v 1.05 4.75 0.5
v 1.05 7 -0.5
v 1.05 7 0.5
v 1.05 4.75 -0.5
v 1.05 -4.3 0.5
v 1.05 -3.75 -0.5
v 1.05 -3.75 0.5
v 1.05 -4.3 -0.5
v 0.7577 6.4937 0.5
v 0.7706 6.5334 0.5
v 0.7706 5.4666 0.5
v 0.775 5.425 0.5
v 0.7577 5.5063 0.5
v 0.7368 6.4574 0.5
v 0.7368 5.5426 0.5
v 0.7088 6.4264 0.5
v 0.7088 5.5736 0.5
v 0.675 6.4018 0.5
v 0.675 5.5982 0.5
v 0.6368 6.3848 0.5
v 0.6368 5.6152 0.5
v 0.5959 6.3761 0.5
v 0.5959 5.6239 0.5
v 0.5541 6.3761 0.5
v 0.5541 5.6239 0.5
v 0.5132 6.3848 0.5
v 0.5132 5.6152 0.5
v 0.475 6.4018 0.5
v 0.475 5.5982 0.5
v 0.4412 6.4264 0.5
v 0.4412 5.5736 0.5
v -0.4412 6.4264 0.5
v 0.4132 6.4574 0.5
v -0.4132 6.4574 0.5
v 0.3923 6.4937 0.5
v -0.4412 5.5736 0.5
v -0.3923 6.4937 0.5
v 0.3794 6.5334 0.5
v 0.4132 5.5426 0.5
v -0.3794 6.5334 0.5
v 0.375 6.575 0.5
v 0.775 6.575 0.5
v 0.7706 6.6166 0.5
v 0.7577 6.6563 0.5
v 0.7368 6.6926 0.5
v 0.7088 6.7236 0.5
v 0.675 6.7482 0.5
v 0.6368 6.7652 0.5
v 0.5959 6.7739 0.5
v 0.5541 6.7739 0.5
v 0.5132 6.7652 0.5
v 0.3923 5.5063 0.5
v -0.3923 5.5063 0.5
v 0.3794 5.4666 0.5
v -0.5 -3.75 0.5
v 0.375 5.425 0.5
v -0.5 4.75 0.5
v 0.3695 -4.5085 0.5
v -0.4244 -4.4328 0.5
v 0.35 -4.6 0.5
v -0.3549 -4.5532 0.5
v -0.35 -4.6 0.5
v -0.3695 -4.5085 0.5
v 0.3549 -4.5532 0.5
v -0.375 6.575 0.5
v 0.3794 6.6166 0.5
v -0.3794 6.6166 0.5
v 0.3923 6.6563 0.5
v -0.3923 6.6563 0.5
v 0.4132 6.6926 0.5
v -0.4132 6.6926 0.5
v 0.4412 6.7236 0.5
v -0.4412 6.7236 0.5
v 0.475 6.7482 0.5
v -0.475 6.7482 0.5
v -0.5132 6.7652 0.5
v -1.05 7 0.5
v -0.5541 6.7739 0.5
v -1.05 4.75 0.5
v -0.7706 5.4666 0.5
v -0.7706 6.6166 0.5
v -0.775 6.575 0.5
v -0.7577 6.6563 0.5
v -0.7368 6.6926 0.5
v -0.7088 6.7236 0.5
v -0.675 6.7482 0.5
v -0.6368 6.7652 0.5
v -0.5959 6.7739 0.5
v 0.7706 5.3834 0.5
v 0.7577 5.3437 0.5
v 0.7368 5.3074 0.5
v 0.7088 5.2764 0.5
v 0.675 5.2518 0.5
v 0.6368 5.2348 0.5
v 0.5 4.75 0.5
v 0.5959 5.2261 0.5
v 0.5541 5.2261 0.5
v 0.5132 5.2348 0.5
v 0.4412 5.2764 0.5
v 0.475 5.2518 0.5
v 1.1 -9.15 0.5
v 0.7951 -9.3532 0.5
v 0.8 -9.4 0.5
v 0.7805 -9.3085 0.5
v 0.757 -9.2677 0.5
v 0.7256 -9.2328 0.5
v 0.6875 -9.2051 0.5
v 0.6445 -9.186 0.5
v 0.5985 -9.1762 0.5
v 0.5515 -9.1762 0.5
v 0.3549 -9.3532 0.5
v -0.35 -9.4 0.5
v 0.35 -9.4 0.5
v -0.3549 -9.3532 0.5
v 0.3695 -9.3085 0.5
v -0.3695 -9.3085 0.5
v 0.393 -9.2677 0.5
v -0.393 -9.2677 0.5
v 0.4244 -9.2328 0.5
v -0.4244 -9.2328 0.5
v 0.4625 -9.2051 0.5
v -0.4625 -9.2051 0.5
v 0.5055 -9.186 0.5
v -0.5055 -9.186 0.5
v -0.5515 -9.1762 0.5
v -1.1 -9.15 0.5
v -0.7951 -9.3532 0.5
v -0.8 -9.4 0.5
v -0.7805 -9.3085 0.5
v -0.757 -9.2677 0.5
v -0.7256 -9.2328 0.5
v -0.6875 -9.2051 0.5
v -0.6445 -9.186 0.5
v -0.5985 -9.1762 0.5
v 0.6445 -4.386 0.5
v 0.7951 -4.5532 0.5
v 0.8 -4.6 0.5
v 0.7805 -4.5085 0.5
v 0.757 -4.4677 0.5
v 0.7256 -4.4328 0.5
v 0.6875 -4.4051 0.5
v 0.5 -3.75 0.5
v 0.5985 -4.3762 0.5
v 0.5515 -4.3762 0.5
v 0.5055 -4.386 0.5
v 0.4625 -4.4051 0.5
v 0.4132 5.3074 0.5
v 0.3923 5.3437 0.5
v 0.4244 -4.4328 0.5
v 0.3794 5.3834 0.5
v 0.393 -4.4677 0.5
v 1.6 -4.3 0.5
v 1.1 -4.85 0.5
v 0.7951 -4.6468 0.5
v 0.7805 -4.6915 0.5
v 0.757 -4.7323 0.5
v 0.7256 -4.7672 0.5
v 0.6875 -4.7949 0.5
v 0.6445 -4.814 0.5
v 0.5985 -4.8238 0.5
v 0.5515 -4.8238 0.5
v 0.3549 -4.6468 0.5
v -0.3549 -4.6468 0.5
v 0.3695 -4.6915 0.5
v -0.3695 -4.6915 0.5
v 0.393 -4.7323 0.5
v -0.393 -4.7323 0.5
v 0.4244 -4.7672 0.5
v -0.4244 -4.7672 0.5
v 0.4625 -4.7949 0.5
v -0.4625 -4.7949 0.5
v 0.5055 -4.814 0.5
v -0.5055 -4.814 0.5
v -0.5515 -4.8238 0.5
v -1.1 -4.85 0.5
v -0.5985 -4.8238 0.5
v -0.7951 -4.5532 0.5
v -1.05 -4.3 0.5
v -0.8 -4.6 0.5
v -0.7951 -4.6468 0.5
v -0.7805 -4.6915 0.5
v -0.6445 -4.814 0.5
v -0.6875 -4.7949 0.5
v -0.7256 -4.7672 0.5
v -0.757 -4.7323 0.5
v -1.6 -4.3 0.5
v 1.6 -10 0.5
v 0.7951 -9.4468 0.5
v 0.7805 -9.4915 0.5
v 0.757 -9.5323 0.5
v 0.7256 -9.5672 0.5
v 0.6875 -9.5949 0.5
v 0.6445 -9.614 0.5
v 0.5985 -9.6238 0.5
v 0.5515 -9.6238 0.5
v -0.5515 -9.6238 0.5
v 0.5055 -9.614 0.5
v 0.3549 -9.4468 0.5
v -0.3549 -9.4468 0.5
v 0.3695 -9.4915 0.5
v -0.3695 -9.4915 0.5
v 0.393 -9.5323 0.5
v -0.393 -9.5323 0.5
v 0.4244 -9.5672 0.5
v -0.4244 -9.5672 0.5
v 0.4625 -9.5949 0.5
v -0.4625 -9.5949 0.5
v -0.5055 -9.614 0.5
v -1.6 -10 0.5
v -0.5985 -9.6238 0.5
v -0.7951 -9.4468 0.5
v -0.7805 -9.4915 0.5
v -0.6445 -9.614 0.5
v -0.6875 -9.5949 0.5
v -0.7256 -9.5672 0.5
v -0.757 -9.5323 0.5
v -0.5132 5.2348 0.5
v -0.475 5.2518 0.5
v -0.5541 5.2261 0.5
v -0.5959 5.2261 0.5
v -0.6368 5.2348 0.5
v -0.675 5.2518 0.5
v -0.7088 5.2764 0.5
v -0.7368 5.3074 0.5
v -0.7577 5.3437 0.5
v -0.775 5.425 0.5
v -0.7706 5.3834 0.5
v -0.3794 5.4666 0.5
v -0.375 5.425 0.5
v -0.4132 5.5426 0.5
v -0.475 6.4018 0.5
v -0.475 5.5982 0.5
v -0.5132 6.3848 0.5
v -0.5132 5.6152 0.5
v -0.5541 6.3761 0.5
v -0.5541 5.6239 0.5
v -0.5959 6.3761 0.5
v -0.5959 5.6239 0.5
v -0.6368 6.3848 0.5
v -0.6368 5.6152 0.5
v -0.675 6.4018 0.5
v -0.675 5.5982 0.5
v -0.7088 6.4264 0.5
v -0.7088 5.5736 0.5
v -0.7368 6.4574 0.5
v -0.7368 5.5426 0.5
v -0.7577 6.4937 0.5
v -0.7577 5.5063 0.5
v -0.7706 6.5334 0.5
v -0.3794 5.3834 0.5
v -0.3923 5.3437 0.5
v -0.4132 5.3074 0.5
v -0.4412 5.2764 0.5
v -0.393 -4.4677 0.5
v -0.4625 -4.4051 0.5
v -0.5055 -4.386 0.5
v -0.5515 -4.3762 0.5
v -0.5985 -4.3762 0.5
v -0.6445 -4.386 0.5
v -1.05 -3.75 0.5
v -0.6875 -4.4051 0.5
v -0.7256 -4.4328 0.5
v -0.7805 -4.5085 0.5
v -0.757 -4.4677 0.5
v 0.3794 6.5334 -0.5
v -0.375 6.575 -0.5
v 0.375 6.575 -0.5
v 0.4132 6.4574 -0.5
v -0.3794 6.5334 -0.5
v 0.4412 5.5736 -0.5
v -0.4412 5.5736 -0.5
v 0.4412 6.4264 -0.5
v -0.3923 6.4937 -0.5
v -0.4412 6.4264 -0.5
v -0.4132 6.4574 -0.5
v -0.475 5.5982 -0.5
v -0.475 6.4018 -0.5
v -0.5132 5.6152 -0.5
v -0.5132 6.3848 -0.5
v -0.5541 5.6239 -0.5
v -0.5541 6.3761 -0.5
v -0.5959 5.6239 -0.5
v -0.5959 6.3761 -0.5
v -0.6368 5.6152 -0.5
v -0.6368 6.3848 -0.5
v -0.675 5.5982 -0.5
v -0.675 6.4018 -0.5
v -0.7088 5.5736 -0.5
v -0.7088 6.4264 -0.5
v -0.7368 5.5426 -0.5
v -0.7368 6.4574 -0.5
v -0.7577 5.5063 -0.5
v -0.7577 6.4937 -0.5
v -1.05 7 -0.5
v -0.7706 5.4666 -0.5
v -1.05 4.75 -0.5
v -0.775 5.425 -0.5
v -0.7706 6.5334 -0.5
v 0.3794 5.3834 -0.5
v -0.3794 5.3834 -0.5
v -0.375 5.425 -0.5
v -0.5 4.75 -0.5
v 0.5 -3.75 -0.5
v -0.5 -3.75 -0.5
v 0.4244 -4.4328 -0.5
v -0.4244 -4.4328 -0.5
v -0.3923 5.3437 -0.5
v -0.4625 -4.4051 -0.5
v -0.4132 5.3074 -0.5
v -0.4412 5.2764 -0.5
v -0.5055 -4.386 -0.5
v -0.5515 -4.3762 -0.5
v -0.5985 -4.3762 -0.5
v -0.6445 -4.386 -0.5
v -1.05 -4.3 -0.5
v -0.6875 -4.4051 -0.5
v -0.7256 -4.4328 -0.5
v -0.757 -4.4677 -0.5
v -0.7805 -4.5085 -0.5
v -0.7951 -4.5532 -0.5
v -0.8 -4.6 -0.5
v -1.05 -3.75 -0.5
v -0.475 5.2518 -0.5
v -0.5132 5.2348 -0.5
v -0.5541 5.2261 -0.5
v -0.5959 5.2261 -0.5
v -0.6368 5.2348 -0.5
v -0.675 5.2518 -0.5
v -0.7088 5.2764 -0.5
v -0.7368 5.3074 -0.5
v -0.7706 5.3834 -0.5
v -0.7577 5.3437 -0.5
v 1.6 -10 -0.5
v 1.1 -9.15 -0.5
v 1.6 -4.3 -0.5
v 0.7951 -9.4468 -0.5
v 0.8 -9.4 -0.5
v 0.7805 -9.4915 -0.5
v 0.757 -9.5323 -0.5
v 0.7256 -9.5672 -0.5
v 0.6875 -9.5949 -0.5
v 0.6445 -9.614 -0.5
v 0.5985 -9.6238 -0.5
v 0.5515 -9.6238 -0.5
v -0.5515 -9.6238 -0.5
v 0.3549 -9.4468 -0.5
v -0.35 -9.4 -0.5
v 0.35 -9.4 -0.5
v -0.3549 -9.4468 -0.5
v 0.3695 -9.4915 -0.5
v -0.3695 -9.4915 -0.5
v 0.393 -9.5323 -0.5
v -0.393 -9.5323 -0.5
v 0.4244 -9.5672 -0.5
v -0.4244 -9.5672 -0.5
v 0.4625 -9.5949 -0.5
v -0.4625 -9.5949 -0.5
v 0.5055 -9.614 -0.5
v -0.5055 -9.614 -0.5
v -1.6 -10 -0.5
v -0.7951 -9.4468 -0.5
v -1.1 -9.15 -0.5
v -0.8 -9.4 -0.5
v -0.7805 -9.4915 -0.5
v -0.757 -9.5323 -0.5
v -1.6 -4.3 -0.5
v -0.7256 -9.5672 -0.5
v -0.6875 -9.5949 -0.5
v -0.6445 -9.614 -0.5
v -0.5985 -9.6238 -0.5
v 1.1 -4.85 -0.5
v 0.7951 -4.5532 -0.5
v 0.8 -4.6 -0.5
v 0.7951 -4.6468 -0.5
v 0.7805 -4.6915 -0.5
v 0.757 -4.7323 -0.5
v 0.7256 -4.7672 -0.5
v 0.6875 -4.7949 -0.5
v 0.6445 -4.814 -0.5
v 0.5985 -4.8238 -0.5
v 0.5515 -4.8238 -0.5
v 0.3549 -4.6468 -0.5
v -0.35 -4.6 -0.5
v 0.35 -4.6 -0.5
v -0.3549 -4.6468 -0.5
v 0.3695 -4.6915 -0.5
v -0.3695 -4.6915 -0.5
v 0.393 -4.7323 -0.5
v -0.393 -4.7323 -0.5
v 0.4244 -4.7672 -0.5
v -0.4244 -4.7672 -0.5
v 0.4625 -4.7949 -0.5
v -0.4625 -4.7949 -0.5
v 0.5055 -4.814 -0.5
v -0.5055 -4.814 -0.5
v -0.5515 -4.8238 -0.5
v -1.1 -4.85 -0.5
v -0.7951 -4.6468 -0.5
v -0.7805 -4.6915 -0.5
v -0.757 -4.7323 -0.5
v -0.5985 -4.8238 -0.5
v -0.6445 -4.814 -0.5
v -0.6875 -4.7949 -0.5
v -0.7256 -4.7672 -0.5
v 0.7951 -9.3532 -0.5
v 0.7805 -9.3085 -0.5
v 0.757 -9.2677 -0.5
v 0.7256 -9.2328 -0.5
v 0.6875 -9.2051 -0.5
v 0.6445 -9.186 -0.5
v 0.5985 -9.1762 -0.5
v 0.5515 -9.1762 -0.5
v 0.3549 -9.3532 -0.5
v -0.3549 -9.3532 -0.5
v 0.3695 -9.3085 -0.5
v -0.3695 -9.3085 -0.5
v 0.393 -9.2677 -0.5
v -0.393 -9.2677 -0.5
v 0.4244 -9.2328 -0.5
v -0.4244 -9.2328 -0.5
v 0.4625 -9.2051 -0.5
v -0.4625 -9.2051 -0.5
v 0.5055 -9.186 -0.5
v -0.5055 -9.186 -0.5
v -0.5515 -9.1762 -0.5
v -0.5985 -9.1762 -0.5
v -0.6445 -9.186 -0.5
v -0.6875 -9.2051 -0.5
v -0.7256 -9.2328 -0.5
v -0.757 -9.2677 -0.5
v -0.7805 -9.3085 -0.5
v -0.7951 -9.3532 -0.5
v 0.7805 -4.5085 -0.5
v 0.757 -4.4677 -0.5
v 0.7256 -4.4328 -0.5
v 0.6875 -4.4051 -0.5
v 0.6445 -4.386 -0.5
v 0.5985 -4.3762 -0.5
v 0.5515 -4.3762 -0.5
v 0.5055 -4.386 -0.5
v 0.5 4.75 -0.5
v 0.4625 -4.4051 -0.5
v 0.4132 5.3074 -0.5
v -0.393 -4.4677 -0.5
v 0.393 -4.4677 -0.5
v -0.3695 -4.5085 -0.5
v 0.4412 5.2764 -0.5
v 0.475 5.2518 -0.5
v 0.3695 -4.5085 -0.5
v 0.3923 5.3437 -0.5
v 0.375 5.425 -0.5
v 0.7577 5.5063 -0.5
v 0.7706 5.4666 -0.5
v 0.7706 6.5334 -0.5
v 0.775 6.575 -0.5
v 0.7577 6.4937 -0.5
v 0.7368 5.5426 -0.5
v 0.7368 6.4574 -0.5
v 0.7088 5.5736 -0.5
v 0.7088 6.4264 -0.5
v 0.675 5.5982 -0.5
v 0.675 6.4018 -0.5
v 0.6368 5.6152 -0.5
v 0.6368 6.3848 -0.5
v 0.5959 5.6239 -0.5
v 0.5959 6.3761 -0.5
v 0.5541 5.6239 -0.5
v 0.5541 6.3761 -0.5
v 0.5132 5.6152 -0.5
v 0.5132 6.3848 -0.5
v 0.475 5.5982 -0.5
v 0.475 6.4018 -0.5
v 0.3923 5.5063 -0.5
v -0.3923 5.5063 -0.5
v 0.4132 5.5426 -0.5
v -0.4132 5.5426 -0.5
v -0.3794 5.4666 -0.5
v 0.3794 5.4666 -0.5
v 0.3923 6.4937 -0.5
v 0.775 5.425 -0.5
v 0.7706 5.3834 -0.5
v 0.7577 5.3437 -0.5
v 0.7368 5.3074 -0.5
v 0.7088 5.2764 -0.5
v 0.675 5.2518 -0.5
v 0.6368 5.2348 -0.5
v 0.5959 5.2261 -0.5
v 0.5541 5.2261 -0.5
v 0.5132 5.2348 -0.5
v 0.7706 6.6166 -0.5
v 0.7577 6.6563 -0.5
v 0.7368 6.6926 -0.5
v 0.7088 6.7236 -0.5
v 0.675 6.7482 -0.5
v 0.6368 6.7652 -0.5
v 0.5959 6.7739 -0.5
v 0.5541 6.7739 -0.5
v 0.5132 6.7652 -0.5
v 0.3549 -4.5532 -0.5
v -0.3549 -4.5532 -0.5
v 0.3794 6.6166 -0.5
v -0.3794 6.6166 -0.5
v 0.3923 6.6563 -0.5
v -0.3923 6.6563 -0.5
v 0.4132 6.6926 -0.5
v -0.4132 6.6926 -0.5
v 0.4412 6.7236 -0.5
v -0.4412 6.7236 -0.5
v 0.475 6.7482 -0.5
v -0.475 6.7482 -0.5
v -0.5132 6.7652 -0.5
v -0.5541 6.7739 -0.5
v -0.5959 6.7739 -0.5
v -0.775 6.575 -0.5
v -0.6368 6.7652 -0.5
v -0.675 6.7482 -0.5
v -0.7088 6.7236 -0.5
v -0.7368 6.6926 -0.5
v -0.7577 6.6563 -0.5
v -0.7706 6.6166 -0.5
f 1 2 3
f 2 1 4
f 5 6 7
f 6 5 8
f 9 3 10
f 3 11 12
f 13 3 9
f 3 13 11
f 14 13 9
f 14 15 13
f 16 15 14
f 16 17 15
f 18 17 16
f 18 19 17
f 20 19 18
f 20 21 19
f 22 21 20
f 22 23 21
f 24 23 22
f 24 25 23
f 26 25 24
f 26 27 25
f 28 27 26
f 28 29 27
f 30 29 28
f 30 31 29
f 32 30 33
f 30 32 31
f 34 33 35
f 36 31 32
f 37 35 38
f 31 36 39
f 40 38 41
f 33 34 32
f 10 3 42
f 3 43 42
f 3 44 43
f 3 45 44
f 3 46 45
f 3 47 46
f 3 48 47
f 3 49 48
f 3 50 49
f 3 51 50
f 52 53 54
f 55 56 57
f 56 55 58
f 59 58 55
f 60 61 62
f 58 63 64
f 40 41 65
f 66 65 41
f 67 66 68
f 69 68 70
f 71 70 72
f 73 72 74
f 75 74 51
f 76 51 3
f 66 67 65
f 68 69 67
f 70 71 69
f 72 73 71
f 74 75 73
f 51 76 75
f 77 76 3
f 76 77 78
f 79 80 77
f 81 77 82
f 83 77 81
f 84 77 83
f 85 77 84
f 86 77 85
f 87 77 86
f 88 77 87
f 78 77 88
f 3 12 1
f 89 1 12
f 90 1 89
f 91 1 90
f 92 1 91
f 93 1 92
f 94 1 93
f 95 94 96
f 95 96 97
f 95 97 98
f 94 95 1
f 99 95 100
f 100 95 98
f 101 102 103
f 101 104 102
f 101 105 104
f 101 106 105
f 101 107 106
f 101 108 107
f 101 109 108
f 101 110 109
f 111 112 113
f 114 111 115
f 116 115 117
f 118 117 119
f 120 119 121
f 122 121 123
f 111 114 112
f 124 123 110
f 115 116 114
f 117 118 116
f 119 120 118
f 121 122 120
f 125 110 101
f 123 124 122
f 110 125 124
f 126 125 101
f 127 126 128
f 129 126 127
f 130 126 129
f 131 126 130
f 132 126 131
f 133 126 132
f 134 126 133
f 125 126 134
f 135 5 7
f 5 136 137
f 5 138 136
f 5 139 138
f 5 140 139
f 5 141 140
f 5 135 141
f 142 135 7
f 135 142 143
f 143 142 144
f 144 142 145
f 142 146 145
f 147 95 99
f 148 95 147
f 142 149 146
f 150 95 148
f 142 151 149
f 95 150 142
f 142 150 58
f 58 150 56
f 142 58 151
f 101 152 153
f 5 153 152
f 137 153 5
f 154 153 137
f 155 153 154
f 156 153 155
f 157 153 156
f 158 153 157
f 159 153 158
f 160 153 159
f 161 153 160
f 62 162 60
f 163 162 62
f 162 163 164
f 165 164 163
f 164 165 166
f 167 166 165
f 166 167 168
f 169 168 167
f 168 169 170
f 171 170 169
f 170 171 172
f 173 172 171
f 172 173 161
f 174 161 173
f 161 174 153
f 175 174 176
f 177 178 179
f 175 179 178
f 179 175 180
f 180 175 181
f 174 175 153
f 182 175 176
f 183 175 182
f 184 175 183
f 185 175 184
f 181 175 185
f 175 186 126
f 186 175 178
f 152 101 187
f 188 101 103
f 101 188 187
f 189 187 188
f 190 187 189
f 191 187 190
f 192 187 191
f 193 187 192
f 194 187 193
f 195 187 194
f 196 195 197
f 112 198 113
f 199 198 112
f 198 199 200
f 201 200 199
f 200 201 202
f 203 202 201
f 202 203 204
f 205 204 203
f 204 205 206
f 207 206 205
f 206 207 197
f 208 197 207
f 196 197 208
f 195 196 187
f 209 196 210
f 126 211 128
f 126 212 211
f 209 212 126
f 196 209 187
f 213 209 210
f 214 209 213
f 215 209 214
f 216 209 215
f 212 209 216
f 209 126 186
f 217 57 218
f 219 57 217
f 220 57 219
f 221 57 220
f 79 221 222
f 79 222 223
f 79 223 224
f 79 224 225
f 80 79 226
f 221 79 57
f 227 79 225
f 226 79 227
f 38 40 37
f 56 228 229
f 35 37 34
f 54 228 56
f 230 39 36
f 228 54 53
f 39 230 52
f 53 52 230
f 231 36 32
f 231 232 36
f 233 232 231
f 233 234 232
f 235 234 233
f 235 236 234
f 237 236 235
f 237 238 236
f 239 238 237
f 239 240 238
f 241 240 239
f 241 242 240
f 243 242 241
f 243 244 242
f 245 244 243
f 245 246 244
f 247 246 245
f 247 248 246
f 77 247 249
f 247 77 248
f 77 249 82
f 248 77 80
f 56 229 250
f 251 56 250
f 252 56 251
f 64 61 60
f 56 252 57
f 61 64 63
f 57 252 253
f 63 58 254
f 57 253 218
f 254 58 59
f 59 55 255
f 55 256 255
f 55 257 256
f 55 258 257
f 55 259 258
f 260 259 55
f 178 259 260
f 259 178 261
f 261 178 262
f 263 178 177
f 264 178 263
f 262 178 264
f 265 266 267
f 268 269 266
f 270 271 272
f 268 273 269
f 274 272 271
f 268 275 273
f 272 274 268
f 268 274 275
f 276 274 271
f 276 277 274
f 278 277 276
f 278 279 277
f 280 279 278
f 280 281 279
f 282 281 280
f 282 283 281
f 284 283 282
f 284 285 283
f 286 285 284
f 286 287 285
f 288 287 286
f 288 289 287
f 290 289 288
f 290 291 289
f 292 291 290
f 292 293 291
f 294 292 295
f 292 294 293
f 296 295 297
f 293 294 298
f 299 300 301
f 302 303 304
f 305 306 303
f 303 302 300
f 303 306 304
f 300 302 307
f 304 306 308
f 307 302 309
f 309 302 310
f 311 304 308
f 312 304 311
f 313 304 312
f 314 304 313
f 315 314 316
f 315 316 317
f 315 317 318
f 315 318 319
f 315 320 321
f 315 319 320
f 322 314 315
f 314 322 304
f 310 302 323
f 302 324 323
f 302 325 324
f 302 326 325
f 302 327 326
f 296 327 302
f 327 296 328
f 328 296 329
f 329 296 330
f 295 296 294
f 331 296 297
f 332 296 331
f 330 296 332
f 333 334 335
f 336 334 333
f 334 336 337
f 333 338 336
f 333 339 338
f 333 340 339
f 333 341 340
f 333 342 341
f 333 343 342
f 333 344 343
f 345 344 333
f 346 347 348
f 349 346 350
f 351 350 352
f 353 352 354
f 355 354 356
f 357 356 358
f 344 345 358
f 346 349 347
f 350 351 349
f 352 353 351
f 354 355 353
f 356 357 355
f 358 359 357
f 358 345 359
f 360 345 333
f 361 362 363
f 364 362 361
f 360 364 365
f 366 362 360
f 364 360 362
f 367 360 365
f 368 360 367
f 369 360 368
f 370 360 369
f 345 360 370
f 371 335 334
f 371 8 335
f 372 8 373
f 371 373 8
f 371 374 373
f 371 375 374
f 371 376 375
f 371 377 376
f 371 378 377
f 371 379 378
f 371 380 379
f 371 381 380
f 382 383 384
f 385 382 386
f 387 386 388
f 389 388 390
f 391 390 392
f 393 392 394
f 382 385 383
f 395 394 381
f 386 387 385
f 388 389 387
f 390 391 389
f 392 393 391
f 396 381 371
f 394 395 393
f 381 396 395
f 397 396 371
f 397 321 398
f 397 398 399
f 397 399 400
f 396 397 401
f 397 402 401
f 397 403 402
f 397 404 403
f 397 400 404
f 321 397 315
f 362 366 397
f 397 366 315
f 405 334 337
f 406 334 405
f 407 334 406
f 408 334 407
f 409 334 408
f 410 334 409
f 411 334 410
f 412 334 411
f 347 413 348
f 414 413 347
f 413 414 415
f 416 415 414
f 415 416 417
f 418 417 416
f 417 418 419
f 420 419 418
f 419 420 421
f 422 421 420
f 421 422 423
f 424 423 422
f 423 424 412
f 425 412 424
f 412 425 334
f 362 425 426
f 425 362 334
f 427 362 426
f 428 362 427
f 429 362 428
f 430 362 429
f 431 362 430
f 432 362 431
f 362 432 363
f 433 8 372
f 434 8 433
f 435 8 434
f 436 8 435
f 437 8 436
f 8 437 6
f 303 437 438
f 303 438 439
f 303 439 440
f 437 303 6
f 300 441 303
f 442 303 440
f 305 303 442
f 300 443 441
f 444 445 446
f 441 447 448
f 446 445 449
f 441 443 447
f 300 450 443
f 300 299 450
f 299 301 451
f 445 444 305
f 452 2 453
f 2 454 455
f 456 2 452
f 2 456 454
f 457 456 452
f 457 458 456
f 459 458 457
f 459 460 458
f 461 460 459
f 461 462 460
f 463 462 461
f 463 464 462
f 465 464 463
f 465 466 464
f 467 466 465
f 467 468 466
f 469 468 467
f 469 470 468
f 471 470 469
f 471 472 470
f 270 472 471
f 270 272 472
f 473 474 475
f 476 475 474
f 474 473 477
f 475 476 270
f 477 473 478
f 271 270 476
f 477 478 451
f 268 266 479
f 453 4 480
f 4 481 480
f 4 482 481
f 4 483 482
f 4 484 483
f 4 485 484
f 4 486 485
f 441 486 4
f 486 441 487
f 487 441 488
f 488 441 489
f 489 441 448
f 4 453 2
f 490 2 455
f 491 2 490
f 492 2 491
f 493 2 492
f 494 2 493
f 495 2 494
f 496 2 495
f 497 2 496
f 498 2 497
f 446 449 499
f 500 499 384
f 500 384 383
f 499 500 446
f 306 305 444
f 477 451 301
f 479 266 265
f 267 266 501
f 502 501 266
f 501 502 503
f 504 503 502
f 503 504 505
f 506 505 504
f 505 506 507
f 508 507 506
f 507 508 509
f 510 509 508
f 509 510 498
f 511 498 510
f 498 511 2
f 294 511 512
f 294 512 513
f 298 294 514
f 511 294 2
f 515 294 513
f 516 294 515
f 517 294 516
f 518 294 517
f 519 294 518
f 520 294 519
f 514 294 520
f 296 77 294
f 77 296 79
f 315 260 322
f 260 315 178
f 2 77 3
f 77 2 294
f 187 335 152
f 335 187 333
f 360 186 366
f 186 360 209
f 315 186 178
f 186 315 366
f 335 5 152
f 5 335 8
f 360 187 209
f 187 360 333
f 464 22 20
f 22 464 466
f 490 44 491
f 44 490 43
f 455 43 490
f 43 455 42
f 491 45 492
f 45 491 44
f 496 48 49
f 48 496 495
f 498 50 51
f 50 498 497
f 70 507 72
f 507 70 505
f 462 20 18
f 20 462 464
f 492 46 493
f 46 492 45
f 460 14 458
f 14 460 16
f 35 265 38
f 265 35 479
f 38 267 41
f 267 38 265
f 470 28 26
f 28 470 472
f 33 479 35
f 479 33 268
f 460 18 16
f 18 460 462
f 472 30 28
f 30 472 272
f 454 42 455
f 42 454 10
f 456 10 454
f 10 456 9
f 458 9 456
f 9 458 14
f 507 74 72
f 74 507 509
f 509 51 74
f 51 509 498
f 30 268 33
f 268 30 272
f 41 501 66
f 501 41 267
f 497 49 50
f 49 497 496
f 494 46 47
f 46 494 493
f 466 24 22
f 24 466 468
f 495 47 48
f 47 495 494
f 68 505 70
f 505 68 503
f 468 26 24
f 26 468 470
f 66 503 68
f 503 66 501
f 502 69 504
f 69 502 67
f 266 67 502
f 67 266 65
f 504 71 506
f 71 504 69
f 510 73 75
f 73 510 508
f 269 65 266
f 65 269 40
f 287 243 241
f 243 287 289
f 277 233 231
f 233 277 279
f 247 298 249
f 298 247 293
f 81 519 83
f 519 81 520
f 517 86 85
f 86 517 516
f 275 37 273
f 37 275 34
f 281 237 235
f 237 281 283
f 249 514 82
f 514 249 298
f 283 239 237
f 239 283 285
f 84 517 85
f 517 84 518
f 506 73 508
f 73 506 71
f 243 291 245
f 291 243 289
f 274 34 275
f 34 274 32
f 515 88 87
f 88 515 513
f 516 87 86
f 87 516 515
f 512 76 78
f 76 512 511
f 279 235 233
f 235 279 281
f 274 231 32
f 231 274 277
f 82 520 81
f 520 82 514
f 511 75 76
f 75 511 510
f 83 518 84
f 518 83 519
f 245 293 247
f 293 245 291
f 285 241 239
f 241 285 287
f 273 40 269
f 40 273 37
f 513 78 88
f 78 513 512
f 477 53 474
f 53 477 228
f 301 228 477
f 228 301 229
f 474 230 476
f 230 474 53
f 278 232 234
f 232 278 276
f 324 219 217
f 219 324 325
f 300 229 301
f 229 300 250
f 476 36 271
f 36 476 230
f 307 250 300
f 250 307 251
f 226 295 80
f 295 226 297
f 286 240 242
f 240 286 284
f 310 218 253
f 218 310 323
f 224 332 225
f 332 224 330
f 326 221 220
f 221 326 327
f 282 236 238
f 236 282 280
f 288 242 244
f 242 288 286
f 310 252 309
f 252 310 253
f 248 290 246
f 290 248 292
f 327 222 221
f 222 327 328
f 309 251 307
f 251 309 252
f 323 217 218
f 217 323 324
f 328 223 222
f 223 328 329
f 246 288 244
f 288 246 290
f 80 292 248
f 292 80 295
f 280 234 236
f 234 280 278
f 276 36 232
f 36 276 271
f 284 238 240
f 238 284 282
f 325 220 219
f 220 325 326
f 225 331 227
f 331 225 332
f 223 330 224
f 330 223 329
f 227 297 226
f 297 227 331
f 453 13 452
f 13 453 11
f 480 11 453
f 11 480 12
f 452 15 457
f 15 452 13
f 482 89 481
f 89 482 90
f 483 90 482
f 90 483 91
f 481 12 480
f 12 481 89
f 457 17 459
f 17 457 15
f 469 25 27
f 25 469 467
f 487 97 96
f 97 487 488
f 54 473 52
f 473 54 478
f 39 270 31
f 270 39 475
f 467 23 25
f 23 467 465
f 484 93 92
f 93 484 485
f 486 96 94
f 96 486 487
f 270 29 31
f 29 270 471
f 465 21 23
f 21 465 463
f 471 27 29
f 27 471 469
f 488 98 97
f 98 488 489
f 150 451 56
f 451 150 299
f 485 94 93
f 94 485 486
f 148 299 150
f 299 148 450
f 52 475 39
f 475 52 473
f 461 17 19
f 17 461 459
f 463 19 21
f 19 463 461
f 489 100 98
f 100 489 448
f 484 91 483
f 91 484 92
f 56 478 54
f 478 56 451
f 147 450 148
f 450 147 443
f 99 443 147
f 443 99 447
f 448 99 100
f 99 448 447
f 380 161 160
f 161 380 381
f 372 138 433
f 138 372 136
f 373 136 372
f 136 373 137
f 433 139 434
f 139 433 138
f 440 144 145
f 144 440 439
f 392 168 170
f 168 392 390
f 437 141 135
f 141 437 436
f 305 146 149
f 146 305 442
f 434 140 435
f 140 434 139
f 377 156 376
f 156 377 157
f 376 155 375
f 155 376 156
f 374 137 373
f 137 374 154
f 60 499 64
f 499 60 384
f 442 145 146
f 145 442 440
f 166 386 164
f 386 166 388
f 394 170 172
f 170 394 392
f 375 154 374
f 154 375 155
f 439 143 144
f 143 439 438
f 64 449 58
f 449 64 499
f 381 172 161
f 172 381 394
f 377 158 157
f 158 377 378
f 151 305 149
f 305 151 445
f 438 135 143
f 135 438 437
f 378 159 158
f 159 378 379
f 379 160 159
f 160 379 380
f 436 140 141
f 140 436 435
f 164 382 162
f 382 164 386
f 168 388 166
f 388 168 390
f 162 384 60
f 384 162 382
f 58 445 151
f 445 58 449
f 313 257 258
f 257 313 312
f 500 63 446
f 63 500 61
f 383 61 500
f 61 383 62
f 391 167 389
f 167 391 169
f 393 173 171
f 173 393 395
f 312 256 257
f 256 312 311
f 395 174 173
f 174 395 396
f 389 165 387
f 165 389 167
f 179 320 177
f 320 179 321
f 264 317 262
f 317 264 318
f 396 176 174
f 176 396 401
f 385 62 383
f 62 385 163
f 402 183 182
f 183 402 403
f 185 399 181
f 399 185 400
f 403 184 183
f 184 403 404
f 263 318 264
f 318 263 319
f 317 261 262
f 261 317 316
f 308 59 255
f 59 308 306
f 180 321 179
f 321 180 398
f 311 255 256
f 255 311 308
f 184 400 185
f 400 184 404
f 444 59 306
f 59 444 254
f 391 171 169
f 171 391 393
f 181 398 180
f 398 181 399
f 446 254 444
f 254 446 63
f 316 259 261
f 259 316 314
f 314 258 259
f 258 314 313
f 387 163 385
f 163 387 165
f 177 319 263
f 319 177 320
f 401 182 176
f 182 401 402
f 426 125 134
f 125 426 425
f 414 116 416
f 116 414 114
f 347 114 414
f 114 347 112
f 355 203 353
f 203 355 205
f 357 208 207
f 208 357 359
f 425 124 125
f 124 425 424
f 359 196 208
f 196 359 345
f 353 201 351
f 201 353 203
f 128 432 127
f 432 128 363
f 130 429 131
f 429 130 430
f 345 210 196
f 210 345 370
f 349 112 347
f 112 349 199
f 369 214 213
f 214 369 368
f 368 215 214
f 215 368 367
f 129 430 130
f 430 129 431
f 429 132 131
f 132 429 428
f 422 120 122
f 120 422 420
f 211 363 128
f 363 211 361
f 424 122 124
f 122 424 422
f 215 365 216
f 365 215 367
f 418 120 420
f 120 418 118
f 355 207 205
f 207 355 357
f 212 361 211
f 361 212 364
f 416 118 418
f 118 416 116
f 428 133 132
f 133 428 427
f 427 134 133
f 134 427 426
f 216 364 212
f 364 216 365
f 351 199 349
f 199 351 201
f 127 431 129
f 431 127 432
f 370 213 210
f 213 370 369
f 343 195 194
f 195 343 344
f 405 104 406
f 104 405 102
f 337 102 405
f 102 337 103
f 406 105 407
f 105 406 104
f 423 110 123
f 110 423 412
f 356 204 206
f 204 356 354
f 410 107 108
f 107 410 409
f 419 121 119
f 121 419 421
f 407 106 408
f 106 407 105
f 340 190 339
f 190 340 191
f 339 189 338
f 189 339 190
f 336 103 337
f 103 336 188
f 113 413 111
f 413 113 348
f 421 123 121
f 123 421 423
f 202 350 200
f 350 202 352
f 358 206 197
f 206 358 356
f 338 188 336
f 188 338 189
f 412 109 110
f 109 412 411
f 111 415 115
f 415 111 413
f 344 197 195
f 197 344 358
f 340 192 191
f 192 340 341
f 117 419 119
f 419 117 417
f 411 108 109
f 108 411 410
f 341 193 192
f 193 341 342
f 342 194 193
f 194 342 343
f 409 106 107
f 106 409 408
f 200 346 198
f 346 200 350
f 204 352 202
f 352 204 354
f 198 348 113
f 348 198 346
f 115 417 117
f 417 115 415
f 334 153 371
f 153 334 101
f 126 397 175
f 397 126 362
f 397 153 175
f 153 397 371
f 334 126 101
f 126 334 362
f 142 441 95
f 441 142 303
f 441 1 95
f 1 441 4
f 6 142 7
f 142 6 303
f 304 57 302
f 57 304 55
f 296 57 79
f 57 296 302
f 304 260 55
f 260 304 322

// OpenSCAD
$fn=30;
module backarm_holes() {
	translate([1.15/2, 1.15/2, 0]) cylinder(d=0.4, h=4, center=true);
	translate([-1.15/2, 1.15/2, 0]) cylinder(d=0.4, h=4, center=true);
	translate([-1.15/2, -1.15/2, 0]) cylinder(d=0.4, h=4, center=true);
	translate([1.15/2, -1.15/2, 0]) cylinder(d=0.4, h=4, center=true);
}

module backarm_servo_holes() {
	translate([1.15/2, 4.8/2, 0]) cylinder(d=0.45, h=4, center=true);
	translate([-1.15/2, 4.8/2, 0]) cylinder(d=0.45, h=4, center=true);
	translate([-1.15/2, -4.8/2, 0]) cylinder(d=0.45, h=4, center=true);
	translate([1.15/2, -4.8/2, 0]) cylinder(d=0.45, h=4, center=true);
}

module backarm() {
	difference() {
		union() {
			cube([2.1, 14, 1], center=true);
			translate([0,-16/2+1,0]) cube([3.2, 5.4, 1], center=true);
			translate([0,-16/2+0.7,0]) cube([3.2, 5.4, 1], center=true);
		}
		translate([0, 12/2,0]) backarm_holes();	
		//translate([0, 19/2+1.5,0]) cube([2.2, 1, 2], center=true);	
		translate([0,-16/2+1,0]) cube([2.2, 4.3, 2], center=true);
		translate([1,0.5,0])cube([1, 8.5, 2], center=true);
		translate([-1,0.5,0])cube([1, 8.5, 2], center=true);
		translate([0, -16/2+1,0]) backarm_servo_holes();
	}
}
backarm();
